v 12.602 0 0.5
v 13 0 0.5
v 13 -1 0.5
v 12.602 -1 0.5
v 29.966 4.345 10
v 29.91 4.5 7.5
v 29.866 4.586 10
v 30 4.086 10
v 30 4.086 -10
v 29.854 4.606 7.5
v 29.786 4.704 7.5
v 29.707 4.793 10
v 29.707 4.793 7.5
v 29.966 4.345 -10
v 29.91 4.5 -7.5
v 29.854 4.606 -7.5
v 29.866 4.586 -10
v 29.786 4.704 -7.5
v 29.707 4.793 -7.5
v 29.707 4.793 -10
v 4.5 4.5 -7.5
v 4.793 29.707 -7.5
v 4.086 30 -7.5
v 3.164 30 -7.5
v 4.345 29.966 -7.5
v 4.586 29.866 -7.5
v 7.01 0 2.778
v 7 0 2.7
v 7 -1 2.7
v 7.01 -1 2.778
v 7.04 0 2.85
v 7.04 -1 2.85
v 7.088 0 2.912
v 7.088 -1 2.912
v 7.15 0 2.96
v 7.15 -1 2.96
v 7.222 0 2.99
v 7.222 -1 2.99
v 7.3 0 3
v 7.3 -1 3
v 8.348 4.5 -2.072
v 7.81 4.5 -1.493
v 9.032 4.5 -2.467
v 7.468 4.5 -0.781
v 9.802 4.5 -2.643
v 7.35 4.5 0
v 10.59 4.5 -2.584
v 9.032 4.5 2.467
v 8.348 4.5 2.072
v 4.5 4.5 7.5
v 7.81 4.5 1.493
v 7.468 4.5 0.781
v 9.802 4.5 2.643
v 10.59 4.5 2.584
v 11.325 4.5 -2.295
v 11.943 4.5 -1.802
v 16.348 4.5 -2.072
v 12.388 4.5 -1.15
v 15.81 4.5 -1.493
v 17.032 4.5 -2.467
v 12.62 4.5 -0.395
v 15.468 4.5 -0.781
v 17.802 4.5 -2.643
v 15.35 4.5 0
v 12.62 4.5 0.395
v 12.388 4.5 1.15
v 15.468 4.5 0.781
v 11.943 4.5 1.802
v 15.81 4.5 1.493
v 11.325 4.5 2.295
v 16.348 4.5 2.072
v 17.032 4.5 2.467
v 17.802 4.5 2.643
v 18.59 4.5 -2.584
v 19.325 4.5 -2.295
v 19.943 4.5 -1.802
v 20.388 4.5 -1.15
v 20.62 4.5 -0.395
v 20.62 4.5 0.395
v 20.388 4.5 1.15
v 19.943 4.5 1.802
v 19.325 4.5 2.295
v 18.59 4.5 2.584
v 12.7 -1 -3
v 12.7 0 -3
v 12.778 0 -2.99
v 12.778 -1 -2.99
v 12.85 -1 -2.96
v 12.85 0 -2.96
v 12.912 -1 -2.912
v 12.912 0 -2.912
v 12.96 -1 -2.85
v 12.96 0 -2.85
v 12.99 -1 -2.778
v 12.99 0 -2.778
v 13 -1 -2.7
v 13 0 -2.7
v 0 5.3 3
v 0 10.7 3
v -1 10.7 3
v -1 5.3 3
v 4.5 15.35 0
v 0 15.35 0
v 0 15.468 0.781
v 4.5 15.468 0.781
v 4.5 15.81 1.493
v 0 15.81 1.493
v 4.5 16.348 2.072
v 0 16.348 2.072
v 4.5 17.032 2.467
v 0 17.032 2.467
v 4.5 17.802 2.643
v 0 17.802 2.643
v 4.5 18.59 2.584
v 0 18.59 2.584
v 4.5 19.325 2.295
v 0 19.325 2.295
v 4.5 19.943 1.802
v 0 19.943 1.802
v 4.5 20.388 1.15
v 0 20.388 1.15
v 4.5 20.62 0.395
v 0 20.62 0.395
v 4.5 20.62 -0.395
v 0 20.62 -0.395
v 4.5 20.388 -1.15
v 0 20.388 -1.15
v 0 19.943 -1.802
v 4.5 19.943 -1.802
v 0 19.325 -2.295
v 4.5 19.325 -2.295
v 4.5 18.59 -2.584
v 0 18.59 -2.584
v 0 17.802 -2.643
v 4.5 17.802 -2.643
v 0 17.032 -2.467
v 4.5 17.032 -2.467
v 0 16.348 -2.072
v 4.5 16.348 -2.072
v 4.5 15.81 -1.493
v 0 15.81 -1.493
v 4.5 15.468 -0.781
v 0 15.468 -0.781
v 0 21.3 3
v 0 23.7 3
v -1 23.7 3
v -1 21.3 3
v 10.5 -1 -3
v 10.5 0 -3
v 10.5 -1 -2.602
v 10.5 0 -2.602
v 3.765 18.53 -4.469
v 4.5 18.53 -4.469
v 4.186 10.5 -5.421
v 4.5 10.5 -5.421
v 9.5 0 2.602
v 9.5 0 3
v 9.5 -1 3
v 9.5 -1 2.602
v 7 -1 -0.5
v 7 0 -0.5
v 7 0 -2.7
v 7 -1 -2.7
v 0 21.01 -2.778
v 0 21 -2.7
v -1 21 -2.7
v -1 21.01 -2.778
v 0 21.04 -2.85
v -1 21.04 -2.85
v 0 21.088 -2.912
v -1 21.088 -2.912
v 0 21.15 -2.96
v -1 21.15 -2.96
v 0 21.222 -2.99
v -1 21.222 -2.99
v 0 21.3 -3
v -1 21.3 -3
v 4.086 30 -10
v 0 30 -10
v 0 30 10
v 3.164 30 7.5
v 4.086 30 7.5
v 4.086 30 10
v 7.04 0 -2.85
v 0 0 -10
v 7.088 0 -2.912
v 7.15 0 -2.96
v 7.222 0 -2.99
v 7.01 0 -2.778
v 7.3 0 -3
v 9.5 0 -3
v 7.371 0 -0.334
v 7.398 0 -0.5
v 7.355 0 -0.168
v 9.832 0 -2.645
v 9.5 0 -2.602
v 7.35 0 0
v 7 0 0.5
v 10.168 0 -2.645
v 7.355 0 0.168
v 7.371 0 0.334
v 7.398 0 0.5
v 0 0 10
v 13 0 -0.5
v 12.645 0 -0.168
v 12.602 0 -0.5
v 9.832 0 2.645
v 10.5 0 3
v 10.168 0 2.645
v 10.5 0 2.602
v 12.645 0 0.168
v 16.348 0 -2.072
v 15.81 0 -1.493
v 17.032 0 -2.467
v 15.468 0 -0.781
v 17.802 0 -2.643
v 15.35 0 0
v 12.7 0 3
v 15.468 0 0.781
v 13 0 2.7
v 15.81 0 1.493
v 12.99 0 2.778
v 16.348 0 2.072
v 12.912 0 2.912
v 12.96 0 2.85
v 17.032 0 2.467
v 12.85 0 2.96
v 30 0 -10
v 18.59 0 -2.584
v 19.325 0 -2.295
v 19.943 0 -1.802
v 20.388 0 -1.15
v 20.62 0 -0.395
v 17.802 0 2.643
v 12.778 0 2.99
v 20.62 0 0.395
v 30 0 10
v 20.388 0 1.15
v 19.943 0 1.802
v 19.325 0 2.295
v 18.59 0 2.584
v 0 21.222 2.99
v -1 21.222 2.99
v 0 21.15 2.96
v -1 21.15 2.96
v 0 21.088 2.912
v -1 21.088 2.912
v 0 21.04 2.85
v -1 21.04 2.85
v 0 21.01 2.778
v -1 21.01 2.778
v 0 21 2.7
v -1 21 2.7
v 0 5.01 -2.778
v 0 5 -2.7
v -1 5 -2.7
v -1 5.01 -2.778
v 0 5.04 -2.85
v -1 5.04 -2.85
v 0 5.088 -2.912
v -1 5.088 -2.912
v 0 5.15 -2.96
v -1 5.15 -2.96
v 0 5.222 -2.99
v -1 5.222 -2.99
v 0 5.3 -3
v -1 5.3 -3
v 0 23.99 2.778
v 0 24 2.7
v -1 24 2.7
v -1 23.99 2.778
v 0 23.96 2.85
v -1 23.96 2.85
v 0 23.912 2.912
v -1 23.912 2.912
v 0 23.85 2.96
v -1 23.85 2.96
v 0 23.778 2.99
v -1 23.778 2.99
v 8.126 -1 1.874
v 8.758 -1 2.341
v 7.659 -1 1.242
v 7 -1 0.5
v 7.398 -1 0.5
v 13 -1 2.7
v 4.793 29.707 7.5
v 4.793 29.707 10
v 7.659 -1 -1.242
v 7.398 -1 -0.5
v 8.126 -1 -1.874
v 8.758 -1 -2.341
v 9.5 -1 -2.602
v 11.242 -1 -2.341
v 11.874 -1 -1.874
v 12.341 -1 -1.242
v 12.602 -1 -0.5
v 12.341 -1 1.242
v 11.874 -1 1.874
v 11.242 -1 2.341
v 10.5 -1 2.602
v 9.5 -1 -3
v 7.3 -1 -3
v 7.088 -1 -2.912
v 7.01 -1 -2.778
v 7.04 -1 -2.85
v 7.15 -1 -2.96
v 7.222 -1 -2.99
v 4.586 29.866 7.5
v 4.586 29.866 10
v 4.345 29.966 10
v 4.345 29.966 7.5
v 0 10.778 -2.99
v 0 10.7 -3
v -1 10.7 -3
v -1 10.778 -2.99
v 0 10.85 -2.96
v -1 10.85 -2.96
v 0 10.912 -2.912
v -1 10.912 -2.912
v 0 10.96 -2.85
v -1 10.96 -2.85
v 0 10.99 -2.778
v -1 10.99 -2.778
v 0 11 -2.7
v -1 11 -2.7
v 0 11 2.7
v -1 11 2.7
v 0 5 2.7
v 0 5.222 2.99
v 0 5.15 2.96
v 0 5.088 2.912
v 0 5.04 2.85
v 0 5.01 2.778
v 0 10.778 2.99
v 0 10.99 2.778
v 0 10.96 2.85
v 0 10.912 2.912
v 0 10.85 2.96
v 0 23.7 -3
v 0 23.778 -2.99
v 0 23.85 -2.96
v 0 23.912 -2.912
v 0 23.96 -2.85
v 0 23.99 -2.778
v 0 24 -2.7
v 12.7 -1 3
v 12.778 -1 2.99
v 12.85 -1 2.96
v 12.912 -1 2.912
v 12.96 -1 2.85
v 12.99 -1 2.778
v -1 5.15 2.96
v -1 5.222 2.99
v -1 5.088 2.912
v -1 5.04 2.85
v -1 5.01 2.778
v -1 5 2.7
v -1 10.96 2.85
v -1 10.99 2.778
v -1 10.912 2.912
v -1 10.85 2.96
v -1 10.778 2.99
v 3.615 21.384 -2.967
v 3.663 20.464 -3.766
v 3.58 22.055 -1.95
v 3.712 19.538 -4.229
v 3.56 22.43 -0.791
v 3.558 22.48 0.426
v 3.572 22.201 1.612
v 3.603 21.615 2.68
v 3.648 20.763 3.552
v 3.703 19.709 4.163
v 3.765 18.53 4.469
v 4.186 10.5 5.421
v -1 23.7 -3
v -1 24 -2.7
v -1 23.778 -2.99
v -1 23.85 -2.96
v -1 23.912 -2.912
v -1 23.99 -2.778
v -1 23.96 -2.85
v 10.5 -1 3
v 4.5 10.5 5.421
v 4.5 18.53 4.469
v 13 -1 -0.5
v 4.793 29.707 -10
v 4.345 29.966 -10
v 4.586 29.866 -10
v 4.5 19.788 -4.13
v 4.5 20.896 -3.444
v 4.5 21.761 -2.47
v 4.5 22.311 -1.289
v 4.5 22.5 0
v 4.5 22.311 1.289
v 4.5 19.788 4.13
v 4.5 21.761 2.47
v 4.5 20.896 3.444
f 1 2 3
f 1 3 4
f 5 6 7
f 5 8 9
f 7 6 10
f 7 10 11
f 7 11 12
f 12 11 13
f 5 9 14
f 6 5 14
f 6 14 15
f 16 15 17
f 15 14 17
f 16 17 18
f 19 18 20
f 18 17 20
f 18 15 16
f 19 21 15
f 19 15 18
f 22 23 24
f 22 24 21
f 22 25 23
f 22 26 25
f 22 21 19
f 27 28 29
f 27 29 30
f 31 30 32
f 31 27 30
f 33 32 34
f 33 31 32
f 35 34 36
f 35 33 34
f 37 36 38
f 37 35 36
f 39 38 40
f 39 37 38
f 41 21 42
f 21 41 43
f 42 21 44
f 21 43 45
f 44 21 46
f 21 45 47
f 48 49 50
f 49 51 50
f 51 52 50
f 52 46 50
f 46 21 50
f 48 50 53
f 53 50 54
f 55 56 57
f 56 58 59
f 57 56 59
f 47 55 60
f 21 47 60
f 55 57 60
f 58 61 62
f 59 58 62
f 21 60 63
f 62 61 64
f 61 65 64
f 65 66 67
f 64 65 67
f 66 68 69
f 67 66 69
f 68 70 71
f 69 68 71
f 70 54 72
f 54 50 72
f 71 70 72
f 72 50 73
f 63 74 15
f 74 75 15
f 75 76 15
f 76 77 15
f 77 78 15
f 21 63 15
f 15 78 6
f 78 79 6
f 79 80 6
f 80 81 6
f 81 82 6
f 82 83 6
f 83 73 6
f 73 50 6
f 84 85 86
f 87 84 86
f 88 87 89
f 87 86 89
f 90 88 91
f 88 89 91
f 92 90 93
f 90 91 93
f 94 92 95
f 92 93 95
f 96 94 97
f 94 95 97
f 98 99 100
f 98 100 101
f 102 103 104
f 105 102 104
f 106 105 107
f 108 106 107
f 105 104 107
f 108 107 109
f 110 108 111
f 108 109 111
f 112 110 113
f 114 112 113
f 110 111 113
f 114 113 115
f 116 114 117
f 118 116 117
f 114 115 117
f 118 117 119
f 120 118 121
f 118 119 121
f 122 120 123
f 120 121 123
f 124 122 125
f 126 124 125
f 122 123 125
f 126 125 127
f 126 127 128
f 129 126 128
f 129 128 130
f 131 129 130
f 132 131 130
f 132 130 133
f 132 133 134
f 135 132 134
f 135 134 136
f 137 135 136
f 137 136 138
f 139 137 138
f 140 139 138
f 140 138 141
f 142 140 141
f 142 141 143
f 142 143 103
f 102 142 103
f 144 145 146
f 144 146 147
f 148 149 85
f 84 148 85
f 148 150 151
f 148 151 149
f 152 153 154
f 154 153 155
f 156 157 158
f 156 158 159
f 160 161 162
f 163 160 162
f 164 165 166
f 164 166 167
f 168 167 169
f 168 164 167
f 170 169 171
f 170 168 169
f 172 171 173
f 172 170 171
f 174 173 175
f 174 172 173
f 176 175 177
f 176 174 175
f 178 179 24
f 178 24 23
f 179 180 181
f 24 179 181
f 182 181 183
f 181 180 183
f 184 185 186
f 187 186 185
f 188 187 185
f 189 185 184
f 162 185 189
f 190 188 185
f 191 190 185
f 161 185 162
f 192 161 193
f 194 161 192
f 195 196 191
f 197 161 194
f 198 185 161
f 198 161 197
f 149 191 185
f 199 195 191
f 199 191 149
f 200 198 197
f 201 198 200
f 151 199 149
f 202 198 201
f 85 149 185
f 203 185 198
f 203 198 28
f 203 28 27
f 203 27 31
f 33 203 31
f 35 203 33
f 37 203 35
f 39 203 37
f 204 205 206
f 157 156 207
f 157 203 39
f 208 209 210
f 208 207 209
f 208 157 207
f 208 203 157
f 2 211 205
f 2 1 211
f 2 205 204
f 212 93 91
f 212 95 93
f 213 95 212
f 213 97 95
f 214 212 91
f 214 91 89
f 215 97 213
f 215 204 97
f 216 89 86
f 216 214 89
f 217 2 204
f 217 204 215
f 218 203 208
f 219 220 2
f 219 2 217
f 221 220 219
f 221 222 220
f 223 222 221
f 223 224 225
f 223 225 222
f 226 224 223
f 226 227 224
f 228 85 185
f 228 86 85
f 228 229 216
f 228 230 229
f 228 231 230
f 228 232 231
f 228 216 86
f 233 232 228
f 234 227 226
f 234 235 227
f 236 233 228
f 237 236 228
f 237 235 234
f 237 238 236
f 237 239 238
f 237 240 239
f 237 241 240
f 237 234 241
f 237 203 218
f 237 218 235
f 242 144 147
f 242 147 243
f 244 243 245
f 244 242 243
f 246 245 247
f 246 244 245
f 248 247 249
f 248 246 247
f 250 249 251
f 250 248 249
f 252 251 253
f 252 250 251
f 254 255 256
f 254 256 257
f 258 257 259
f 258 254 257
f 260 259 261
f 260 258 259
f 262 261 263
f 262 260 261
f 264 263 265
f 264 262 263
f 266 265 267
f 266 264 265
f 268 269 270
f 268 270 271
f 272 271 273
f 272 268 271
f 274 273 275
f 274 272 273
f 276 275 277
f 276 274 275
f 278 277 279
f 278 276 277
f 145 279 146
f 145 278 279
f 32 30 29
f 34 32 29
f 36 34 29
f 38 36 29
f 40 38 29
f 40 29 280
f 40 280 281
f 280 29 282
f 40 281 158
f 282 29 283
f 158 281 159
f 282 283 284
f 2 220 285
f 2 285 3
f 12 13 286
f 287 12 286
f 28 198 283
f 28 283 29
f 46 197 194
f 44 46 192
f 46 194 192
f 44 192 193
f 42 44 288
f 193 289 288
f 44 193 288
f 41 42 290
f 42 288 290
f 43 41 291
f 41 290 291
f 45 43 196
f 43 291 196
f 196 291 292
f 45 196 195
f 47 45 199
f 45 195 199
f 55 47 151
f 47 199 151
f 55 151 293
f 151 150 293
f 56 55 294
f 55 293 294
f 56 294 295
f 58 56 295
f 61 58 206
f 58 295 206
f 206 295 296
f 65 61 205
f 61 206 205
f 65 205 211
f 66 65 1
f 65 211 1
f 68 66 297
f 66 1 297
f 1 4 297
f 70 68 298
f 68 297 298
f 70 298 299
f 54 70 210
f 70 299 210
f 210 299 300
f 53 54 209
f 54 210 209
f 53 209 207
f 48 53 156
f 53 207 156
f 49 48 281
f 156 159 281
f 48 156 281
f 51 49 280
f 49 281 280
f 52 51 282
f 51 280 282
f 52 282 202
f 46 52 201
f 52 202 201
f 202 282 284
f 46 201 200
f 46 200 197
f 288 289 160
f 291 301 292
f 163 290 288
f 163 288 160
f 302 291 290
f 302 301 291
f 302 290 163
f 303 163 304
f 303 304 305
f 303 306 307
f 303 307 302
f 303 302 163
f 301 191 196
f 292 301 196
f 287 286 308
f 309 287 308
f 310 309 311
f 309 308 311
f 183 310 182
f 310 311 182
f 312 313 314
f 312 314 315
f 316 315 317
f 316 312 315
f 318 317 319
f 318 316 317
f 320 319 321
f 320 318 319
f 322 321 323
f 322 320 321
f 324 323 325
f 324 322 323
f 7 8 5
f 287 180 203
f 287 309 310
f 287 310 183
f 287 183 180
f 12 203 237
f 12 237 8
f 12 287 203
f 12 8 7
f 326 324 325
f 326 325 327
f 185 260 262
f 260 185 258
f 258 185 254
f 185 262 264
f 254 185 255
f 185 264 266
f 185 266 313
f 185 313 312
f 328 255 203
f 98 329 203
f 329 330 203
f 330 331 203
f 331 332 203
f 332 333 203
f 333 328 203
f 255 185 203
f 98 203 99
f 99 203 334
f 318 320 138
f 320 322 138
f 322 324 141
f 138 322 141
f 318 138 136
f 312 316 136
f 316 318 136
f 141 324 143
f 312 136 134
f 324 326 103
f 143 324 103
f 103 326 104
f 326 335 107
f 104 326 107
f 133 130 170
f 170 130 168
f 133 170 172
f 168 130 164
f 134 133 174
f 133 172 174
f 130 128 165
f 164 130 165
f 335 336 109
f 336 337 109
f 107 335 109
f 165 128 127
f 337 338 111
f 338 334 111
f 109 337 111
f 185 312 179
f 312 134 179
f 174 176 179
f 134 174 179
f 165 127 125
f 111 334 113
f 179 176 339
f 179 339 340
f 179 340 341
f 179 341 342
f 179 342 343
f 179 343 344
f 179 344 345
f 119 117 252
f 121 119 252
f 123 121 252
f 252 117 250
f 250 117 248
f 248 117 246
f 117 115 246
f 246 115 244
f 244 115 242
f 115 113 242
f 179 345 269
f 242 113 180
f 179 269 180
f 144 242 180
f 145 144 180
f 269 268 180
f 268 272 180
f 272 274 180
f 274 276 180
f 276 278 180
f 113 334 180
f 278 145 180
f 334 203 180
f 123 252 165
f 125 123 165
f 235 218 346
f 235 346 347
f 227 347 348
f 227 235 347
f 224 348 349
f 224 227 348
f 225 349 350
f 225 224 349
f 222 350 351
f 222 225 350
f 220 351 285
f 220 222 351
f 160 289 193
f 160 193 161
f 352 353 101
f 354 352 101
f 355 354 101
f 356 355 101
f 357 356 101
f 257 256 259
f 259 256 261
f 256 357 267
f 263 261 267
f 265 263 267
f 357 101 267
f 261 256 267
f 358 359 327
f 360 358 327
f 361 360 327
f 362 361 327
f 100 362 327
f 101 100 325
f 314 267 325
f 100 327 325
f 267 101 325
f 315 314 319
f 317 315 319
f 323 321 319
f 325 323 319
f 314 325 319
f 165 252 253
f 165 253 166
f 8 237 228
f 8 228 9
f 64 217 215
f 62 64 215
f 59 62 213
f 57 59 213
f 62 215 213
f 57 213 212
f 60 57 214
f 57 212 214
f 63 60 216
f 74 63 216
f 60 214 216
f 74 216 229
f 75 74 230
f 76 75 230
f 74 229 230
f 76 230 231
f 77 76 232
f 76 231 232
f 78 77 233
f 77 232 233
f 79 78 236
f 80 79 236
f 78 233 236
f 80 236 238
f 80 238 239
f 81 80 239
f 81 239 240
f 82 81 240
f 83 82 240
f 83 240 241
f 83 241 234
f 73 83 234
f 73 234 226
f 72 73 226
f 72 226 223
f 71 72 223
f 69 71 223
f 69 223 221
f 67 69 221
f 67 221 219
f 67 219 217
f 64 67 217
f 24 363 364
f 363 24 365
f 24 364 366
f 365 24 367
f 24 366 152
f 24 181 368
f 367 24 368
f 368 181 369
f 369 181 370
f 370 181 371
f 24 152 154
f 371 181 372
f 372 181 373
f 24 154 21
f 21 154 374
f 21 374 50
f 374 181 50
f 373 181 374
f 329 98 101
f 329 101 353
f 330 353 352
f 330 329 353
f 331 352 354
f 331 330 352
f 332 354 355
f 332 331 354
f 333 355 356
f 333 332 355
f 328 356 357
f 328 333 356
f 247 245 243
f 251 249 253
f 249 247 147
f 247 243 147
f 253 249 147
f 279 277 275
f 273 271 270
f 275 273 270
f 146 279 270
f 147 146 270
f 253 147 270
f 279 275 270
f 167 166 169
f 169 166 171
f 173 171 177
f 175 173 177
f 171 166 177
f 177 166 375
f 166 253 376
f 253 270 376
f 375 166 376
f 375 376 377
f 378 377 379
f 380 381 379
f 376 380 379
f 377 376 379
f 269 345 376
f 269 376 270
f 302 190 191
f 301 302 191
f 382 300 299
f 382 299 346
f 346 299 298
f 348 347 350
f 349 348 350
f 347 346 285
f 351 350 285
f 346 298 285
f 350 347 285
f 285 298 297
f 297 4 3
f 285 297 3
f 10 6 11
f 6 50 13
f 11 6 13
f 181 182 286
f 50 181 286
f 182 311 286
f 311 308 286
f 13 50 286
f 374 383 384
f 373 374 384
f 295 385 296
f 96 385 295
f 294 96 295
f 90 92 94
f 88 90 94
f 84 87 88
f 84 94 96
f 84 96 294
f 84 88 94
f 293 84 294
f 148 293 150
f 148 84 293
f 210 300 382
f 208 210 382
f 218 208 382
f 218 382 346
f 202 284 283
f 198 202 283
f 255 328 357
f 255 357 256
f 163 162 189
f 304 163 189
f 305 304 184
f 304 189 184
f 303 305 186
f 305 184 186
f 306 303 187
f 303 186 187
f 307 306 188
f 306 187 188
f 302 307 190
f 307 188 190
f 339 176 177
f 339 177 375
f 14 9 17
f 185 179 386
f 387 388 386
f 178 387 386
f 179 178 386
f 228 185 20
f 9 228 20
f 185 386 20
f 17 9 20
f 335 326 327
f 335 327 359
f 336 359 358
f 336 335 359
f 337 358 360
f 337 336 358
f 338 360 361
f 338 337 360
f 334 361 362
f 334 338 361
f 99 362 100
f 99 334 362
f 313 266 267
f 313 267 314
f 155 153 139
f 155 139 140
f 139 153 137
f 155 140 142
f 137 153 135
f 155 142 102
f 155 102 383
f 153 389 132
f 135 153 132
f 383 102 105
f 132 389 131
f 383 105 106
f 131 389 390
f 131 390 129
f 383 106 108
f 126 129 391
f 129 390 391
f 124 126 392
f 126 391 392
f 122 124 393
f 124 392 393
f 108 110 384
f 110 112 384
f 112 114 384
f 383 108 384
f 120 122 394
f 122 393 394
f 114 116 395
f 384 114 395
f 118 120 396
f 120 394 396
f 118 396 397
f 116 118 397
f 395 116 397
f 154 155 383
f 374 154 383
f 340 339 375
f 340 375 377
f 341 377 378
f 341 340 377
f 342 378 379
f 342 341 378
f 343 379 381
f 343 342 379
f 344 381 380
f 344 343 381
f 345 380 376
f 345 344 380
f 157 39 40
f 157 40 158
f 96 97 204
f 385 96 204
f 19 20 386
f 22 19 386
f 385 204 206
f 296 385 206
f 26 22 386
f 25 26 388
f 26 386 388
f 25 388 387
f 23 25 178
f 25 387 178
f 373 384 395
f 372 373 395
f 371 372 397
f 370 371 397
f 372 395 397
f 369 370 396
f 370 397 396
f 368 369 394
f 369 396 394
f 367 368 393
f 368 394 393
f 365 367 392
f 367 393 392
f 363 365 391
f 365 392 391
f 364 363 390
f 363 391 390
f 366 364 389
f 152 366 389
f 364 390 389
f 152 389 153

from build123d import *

# Parameters (mm, degrees)
SKETCH1_W               = 30
SKETCH1_H               = 30
BOSS_EXTRUDE1_DEPTH     = 10
CUT_EXTRUDE3_DEPTH      = 10
CUT_EXTRUDE3_DEPTH_BACK = 10
SKETCH7_OUTSIDE_W       = 41.38
SKETCH7_OUTSIDE_H       = 41.38
CUT_EXTRUDE4_DEPTH      = 7.5
BOSS_EXTRUDE3_REACH     = 50.089
BOSS_EXTRUDE3_START     = 4.5
DIAMETER_HOLE1_D        = 5.3
BOSS_EXTRUDE4_DEPTH     = 1
BOSS_EXTRUDE5_DEPTH     = 1
DIAMETER_HOLE2_D        = 5.3
DIAMETER_HOLE3_D        = 5.3


with BuildPart() as part:
    # Sketch1 → Boss-Extrude1 (new, symmetric)
    with BuildSketch(Plane.XY):
        with Locations((15, 15)):
            Rectangle(SKETCH1_W, SKETCH1_H)
    extrude(amount=BOSS_EXTRUDE1_DEPTH, both=True)

    # Sketch7 outside → Cut-Extrude3 (cut, two sides: drawn at the far end of the back side and taken through both)
    with BuildSketch(Plane.XY.offset(-CUT_EXTRUDE3_DEPTH_BACK)):
        with Locations((15, 15)):
            Rectangle(SKETCH7_OUTSIDE_W, SKETCH7_OUTSIDE_H)
        with BuildLine():
            Line((0, 0), (30, 0))
            Line((30, 0), (30, 4.085786438))
            ThreePointArc((30, 4.085786438), (29.923879533, 4.46846987), (29.707106781, 4.792893219))
            Line((29.707106781, 4.792893219), (4.792893219, 29.707106781))
            ThreePointArc((4.792893219, 29.707106781), (4.46846987, 29.923879533), (4.085786438, 30))
            Line((4.085786438, 30), (0, 30))
            Line((0, 30), (0, 0))
        make_face(mode=Mode.SUBTRACT)
    extrude(amount=CUT_EXTRUDE3_DEPTH + CUT_EXTRUDE3_DEPTH_BACK, mode=Mode.SUBTRACT)

    # Sketch8 → Cut-Extrude4 (cut, symmetric)
    with BuildSketch(Plane.XY):
        Polygon((3.163601628, 30), (4.5, 4.5), (30, 4.5), (30, 30), align=None)
    extrude(amount=CUT_EXTRUDE4_DEPTH, both=True, mode=Mode.SUBTRACT)

    # Boss-Extrude3: up to this plane
    boss_extrude3_end = Plane(origin=(3.163601628, 30, -7.5), z_dir=(-0.9986295347545743, -0.05233595624293714, 0))
    # Sketch9 → Boss-Extrude3 (add, up to the surface)
    with BuildSketch(Plane(origin=(0, 0, 0), x_dir=(0, 0, -1), z_dir=(1, 0, 0)).offset(BOSS_EXTRUDE3_START), mode=Mode.PRIVATE) as boss_extrude3_sk1:
        with BuildLine():
            Line((4.468669433, 18.530088202), (5.421224791, 10.5))
            Line((5.421224791, 10.5), (-5.421224791, 10.5))
            Line((-5.421224791, 10.5), (-4.468669433, 18.530088202))
            ThreePointArc((-4.468669433, 18.530088202), (0, 22.5), (4.468669433, 18.530088202))
        make_face()
    boss_extrude3_tool1 = split(extrude(boss_extrude3_sk1.sketch, amount=-BOSS_EXTRUDE3_REACH, mode=Mode.PRIVATE), bisect_by=boss_extrude3_end, keep=Keep.BOTH, mode=Mode.PRIVATE)
    add(boss_extrude3_tool1.solids().sort_by_distance((4.5, 15.863056, 0))[0])

    # Diameter Hole1 (through all)
    with Locations(Plane(origin=(0, 30, 0), x_dir=(1, 0, 0), z_dir=(0, 1, 0))):
        with Locations((18, 0)):
            Hole(DIAMETER_HOLE1_D / 2)

    # Sketch12 → Boss-Extrude4 (add)
    with BuildSketch(Plane(origin=(0, 0, 0), x_dir=(0, 0, -1), z_dir=(1, 0, 0))):
        with BuildLine():
            Line((2.7, 24), (-2.7, 24))
            ThreePointArc((-2.7, 24), (-2.912132034, 23.912132034), (-3, 23.7))
            Line((-3, 23.7), (-3, 21.3))
            ThreePointArc((-3, 21.3), (-2.912132034, 21.087867966), (-2.7, 21))
            Line((-2.7, 21), (2.7, 21))
            ThreePointArc((2.7, 21), (2.912132034, 21.087867966), (3, 21.3))
            Line((3, 21.3), (3, 23.7))
            ThreePointArc((3, 23.7), (2.912132034, 23.912132034), (2.7, 24))
        make_face()
        with BuildLine():
            Line((2.7, 11), (-2.7, 11))
            ThreePointArc((-2.7, 11), (-2.912132034, 10.912132034), (-3, 10.7))
            Line((-3, 10.7), (-3, 5.3))
            ThreePointArc((-3, 5.3), (-2.912132034, 5.087867966), (-2.7, 5))
            Line((-2.7, 5), (2.7, 5))
            ThreePointArc((2.7, 5), (2.912132034, 5.087867966), (3, 5.3))
            Line((3, 5.3), (3, 10.7))
            ThreePointArc((3, 10.7), (2.912132034, 10.912132034), (2.7, 11))
        make_face()
    extrude(amount=-BOSS_EXTRUDE4_DEPTH)

    # Sketch13 → Boss-Extrude5 (add)
    with BuildSketch(Plane(origin=(0, 0, 0), x_dir=(1, 0, 0), z_dir=(0, 1, 0))):
        with BuildLine():
            Line((10.5, -3), (12.7, -3))
            ThreePointArc((12.7, -3), (12.912132034, -2.912132034), (13, -2.7))
            Line((13, -2.7), (13, -0.5))
            Line((13, -0.5), (10.5, -0.5))
            Line((10.5, -0.5), (10.5, -3))
        make_face()
        with BuildLine():
            Line((7.3, -3), (9.5, -3))
            Line((9.5, -3), (9.5, -0.5))
            Line((9.5, -0.5), (7, -0.5))
            Line((7, -0.5), (7, -2.7))
            ThreePointArc((7, -2.7), (7.087867966, -2.912132034), (7.3, -3))
        make_face()
        with BuildLine():
            Line((7.3, 3), (9.5, 3))
            Line((9.5, 3), (9.5, 0.5))
            Line((9.5, 0.5), (7, 0.5))
            Line((7, 0.5), (7, 2.7))
            ThreePointArc((7, 2.7), (7.087867966, 2.912132034), (7.3, 3))
        make_face()
        with BuildLine():
            Line((10.5, 3), (12.7, 3))
            ThreePointArc((12.7, 3), (12.912132034, 2.912132034), (13, 2.7))
            Line((13, 2.7), (13, 0.5))
            Line((13, 0.5), (10.5, 0.5))
            Line((10.5, 0.5), (10.5, 3))
        make_face()
    extrude(amount=-BOSS_EXTRUDE5_DEPTH)

    # Diameter Hole2 (through all)
    with Locations(Plane(origin=(30, 10, 0), x_dir=(0, 1, 0), z_dir=(1, 0, 0))):
        with Locations((8, 0)):
            Hole(DIAMETER_HOLE2_D / 2)

    # Diameter Hole3 (through all)
    with Locations(Plane(origin=(0, 30, 0), x_dir=(1, 0, 0), z_dir=(0, 1, 0))):
        with Locations((10, 0)):
            Hole(DIAMETER_HOLE3_D / 2)


solid = part.part
